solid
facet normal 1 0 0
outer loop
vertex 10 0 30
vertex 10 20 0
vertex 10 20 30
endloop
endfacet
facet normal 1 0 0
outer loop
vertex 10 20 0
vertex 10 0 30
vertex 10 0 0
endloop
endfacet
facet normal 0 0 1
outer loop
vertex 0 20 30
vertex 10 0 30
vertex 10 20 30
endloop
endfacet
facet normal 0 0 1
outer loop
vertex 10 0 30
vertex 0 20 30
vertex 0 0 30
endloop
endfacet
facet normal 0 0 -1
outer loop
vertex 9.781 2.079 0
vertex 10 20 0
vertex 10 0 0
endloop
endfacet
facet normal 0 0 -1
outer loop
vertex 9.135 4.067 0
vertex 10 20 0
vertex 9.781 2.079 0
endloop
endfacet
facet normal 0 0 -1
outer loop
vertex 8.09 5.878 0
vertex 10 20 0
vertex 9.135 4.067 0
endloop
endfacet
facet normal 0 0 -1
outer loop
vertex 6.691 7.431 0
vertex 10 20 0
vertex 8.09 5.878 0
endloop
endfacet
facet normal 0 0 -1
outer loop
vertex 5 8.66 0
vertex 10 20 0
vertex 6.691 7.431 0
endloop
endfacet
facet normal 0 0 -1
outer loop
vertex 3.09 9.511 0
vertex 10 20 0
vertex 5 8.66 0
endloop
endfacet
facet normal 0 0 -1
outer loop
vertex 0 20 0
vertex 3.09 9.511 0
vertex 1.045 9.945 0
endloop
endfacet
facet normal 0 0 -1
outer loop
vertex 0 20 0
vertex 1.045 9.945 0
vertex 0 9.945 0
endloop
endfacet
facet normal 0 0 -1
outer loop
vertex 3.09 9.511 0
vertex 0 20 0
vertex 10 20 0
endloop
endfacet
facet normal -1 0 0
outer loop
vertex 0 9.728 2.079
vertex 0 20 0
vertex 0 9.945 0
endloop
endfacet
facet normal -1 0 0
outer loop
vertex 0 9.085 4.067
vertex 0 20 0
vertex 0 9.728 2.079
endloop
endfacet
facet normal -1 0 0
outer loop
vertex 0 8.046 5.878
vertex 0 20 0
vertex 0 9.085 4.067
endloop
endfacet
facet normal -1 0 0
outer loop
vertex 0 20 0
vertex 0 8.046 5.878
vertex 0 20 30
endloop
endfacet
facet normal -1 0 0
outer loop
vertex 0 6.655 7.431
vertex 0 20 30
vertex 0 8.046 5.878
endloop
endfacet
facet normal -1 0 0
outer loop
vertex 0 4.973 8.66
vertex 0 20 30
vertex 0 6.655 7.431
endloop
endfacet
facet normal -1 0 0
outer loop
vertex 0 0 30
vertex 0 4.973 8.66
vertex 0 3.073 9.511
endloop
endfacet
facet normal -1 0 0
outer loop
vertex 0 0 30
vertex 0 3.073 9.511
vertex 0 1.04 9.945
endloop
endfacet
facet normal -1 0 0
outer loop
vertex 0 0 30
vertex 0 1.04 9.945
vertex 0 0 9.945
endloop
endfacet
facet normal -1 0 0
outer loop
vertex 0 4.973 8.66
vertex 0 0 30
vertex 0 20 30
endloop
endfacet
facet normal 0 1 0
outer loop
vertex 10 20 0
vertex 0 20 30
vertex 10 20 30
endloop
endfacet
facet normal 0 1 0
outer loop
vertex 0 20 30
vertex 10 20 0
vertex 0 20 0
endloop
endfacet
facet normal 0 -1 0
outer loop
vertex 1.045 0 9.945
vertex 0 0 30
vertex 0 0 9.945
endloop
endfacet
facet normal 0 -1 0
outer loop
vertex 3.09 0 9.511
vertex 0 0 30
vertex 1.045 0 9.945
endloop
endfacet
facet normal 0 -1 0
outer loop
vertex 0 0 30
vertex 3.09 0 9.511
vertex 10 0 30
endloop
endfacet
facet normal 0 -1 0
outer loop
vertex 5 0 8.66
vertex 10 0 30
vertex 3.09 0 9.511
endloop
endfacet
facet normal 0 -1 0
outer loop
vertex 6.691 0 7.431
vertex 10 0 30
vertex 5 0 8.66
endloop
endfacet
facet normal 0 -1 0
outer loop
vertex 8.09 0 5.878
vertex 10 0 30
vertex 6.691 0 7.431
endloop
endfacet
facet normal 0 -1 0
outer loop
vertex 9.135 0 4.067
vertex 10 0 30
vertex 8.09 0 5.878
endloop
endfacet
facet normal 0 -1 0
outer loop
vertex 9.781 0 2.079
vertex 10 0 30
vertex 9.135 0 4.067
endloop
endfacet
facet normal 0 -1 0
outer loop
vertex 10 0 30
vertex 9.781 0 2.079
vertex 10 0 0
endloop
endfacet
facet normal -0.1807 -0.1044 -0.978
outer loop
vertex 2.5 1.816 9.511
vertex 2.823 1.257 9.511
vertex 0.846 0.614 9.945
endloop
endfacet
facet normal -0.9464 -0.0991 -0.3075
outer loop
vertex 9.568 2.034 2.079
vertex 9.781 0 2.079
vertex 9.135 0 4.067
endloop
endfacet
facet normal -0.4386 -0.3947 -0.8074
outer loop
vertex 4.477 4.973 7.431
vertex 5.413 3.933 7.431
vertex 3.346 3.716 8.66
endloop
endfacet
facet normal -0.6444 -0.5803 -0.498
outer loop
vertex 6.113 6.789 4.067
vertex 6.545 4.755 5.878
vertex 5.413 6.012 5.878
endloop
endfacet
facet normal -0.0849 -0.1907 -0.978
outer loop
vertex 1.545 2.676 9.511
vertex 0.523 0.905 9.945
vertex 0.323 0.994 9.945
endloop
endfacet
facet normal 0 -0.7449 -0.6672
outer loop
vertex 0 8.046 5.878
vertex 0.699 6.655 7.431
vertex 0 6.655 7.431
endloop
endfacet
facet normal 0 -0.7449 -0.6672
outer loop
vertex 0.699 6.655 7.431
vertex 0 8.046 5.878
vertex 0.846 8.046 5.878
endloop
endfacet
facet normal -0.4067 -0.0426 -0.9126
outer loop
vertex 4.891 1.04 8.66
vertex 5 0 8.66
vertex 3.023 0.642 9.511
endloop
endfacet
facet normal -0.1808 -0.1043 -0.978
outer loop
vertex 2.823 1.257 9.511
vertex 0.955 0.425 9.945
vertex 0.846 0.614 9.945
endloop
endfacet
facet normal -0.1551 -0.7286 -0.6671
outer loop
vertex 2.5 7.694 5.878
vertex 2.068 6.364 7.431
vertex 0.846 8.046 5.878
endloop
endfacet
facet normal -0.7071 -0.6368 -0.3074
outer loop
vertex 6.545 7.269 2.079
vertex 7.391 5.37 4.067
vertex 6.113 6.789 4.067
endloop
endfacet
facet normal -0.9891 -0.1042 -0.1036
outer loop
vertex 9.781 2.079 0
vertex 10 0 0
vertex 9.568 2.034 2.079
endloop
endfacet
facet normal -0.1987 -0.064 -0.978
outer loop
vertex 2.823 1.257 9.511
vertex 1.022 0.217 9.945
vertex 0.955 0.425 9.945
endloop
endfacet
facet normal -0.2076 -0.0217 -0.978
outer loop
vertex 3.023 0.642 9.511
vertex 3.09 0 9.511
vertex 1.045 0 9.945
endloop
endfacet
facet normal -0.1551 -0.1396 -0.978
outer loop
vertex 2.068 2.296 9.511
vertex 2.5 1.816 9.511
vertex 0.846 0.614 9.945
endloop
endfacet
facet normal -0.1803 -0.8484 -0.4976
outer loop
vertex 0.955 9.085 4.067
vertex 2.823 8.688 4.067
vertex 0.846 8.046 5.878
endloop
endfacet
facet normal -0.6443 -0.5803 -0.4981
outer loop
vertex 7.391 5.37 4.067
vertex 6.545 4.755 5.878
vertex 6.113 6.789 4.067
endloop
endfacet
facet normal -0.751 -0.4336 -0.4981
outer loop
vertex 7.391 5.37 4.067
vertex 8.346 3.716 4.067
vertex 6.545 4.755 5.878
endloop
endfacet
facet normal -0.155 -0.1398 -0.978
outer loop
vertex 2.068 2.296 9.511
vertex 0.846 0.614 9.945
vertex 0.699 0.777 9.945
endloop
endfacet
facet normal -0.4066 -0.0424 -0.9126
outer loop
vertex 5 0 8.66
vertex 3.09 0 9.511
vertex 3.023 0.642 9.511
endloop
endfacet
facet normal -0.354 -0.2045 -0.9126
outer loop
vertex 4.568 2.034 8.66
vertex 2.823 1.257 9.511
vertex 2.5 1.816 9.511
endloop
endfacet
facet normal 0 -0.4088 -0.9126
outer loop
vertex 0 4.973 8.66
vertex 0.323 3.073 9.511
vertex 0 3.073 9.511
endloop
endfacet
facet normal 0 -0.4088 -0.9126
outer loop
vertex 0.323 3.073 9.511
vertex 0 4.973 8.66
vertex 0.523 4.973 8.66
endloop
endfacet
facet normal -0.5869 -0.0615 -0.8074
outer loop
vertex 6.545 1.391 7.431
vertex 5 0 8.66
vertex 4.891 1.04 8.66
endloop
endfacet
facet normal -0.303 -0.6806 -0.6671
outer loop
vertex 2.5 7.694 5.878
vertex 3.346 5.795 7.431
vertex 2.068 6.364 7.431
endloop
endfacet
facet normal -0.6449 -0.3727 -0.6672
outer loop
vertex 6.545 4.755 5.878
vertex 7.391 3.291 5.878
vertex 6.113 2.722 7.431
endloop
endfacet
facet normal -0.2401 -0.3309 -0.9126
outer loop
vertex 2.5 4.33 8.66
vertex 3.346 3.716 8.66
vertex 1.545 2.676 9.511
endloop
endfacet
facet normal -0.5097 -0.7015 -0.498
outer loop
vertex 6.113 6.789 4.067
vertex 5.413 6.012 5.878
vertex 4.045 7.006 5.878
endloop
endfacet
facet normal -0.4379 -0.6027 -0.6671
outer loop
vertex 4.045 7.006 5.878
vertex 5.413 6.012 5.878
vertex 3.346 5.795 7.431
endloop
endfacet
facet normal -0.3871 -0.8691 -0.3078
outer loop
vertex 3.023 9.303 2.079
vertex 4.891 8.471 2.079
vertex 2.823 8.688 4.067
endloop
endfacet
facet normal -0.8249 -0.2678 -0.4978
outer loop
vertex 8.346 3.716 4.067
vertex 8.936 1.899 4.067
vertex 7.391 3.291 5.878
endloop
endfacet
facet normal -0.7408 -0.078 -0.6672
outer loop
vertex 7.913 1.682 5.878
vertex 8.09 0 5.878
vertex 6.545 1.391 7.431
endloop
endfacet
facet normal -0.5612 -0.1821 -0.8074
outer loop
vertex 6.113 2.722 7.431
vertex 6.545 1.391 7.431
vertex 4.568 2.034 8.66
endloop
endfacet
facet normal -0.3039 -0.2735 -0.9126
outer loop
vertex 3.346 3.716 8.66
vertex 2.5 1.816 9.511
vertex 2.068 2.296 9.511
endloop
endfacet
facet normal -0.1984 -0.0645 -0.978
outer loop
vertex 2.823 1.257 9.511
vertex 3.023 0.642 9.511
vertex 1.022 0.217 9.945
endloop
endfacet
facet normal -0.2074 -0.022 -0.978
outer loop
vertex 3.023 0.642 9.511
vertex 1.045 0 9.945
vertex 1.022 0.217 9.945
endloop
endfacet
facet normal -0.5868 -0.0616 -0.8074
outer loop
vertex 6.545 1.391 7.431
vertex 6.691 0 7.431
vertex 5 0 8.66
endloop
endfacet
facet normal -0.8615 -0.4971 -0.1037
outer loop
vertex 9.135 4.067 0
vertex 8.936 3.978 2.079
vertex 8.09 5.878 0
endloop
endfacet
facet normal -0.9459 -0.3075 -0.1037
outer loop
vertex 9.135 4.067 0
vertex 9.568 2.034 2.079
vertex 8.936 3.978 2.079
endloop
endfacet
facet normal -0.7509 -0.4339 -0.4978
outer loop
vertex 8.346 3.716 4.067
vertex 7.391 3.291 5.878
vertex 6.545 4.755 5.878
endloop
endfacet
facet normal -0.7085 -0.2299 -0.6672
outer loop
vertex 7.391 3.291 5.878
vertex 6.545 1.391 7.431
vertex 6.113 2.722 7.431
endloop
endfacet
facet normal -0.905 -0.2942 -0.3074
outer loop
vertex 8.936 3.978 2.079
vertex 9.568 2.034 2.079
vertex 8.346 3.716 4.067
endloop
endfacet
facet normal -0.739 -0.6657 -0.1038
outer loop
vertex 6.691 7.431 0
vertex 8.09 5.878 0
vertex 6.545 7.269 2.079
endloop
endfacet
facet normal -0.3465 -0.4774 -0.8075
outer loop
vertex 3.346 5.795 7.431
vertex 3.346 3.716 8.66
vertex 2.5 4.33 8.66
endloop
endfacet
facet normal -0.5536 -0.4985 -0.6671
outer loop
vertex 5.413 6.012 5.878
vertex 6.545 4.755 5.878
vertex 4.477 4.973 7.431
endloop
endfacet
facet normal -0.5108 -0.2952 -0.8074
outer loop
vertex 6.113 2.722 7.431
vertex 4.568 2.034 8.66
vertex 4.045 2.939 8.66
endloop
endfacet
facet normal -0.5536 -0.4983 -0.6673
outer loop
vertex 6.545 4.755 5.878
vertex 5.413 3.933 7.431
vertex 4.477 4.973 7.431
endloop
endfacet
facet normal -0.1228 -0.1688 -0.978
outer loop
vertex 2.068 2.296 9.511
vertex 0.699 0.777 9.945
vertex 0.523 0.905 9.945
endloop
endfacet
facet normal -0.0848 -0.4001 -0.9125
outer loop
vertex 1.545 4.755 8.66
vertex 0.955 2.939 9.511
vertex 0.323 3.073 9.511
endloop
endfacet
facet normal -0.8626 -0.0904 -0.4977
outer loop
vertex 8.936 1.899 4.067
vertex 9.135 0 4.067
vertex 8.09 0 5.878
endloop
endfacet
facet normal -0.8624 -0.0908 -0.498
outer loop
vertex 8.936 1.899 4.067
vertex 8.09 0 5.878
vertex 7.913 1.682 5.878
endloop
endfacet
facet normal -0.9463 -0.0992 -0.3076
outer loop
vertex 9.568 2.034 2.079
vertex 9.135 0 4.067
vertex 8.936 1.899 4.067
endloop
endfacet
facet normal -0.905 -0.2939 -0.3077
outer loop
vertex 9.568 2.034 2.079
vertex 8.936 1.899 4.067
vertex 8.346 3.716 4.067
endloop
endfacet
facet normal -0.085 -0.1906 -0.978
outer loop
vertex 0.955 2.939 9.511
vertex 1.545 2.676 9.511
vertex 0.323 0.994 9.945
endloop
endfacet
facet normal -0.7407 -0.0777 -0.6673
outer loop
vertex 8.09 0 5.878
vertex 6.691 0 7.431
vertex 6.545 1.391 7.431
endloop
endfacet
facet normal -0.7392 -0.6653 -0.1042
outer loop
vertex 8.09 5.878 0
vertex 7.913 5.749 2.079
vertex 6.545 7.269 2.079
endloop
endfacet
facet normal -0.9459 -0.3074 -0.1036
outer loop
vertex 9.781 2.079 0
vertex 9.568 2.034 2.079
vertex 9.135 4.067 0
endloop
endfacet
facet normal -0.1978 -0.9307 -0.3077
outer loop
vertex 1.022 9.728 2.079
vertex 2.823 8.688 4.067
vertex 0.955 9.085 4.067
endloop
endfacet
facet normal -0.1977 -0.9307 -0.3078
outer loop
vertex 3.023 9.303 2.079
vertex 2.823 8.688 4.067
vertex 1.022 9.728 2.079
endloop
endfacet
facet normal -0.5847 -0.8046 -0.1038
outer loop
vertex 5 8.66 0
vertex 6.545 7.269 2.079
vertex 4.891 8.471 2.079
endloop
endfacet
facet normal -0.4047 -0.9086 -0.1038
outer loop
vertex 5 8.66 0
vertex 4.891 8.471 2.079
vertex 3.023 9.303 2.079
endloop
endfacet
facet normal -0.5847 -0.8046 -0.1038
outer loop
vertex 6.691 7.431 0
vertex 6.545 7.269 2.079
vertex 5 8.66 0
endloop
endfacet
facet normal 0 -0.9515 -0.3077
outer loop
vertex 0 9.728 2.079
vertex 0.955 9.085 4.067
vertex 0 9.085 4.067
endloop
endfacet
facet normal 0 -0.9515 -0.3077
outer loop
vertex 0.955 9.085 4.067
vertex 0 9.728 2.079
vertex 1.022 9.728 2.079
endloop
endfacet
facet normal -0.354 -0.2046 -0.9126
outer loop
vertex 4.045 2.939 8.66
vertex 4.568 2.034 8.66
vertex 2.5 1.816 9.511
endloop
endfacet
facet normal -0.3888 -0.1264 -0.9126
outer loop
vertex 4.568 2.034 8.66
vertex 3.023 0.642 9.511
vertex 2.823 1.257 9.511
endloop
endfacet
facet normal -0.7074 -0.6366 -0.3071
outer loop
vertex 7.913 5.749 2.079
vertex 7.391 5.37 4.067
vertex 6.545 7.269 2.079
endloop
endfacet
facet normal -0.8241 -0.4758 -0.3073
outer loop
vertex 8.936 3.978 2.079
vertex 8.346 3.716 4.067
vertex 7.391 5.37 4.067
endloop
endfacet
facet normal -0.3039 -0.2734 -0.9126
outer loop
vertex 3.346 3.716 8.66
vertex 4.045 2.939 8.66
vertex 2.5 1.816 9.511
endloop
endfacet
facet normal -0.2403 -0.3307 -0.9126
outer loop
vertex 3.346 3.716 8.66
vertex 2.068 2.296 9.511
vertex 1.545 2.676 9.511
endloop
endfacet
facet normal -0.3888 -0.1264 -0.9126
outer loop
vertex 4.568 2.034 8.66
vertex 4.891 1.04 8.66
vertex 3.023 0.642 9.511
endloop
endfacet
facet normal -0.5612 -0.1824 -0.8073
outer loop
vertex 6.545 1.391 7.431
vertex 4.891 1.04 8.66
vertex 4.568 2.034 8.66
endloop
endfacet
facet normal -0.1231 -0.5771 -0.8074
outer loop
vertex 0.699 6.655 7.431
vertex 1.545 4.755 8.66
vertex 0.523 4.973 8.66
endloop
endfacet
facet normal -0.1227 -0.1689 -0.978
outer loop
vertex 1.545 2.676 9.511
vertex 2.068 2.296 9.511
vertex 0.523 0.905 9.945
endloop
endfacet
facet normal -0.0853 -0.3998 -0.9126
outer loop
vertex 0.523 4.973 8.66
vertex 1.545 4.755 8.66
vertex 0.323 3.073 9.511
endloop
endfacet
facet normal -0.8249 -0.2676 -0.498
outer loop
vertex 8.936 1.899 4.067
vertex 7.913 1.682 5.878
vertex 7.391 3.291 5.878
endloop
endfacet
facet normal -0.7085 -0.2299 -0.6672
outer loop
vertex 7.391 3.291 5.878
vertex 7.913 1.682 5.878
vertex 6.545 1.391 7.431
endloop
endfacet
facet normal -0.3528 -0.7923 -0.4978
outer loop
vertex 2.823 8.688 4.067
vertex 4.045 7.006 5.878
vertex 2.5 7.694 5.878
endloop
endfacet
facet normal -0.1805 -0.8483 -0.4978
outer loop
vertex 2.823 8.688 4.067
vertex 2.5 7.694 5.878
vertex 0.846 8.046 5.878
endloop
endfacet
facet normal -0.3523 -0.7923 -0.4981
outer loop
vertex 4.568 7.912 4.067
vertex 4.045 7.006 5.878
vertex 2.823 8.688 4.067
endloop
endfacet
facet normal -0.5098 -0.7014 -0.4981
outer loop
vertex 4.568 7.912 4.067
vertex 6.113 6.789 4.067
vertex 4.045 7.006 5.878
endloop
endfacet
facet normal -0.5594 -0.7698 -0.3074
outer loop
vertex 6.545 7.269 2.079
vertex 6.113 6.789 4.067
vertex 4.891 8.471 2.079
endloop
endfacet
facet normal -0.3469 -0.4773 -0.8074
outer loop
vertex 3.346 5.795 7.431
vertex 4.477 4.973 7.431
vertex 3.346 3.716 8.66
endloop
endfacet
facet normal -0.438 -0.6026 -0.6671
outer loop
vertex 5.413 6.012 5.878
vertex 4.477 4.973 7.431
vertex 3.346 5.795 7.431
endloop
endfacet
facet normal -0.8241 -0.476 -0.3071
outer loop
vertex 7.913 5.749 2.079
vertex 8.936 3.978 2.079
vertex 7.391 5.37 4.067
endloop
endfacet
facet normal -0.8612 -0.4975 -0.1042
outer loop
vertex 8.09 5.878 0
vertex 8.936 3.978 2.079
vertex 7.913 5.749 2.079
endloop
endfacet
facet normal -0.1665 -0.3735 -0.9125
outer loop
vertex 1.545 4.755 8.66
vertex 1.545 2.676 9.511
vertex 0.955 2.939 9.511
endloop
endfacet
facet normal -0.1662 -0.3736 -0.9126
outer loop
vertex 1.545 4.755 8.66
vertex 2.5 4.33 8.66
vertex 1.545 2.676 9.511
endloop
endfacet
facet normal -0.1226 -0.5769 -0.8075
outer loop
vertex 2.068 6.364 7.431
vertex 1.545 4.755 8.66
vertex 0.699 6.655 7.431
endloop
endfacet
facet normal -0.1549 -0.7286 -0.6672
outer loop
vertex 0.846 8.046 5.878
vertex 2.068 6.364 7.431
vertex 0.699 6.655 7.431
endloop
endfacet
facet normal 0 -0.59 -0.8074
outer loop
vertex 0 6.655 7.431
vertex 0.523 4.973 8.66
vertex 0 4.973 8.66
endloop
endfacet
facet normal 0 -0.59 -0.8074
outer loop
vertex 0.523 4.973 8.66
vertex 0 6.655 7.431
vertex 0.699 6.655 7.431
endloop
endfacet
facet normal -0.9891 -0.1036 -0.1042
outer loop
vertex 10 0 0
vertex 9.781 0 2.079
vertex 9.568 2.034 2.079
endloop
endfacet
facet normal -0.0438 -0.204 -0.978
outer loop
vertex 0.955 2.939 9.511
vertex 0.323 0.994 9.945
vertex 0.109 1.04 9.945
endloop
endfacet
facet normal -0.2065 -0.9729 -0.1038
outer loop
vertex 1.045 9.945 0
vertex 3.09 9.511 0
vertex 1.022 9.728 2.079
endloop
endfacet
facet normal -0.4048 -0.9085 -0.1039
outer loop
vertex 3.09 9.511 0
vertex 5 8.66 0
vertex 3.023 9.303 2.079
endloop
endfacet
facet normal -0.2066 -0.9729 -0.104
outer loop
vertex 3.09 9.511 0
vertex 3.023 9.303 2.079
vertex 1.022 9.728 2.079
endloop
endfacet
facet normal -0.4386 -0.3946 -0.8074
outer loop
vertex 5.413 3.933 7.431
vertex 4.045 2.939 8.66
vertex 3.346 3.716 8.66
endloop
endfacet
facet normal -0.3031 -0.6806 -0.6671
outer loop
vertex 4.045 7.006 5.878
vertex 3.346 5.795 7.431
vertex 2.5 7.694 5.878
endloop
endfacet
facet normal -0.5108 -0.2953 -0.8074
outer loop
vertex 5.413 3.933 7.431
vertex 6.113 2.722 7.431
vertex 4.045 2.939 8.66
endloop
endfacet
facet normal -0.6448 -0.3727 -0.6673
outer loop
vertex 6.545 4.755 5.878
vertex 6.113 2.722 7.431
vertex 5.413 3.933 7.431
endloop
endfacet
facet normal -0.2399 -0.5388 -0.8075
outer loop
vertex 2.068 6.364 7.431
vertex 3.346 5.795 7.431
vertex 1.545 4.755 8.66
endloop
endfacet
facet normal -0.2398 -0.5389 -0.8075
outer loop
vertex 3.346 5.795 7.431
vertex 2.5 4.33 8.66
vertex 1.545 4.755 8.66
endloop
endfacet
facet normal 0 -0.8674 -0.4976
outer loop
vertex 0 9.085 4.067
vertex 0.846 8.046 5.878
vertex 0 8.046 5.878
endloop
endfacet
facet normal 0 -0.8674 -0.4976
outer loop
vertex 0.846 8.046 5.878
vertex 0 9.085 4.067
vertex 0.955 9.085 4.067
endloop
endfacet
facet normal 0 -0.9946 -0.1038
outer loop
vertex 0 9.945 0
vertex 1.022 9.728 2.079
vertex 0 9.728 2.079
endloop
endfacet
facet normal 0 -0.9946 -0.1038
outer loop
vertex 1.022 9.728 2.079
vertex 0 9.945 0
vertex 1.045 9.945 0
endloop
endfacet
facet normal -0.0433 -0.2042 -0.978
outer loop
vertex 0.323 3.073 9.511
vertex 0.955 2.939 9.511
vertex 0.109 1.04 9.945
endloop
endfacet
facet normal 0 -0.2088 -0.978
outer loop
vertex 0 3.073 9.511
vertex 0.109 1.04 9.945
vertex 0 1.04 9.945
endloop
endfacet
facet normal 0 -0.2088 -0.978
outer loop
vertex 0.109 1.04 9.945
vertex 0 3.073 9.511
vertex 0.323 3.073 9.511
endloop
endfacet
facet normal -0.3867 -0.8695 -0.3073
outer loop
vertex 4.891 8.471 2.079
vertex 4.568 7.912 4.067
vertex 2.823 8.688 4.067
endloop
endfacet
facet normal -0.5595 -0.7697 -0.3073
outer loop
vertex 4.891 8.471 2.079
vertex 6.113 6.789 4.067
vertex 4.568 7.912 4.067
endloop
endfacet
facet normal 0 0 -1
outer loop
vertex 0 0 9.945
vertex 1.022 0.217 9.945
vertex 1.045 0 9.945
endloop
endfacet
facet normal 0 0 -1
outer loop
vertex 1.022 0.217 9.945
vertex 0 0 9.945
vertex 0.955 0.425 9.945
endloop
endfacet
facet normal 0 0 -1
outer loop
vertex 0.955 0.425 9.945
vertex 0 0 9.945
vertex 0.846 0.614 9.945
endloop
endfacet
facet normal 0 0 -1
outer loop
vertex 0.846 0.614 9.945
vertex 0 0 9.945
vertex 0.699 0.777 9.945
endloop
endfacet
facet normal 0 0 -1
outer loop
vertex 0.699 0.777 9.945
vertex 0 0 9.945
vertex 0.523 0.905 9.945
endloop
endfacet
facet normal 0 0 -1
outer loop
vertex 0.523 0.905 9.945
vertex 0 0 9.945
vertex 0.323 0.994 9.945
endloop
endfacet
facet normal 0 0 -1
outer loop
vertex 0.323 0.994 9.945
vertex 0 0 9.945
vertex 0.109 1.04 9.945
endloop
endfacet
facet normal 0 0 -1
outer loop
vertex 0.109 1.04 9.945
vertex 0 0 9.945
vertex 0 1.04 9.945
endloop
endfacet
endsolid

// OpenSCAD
difference() {
	cube(size = [10, 20, 30]);
	sphere(r = 10);
}
